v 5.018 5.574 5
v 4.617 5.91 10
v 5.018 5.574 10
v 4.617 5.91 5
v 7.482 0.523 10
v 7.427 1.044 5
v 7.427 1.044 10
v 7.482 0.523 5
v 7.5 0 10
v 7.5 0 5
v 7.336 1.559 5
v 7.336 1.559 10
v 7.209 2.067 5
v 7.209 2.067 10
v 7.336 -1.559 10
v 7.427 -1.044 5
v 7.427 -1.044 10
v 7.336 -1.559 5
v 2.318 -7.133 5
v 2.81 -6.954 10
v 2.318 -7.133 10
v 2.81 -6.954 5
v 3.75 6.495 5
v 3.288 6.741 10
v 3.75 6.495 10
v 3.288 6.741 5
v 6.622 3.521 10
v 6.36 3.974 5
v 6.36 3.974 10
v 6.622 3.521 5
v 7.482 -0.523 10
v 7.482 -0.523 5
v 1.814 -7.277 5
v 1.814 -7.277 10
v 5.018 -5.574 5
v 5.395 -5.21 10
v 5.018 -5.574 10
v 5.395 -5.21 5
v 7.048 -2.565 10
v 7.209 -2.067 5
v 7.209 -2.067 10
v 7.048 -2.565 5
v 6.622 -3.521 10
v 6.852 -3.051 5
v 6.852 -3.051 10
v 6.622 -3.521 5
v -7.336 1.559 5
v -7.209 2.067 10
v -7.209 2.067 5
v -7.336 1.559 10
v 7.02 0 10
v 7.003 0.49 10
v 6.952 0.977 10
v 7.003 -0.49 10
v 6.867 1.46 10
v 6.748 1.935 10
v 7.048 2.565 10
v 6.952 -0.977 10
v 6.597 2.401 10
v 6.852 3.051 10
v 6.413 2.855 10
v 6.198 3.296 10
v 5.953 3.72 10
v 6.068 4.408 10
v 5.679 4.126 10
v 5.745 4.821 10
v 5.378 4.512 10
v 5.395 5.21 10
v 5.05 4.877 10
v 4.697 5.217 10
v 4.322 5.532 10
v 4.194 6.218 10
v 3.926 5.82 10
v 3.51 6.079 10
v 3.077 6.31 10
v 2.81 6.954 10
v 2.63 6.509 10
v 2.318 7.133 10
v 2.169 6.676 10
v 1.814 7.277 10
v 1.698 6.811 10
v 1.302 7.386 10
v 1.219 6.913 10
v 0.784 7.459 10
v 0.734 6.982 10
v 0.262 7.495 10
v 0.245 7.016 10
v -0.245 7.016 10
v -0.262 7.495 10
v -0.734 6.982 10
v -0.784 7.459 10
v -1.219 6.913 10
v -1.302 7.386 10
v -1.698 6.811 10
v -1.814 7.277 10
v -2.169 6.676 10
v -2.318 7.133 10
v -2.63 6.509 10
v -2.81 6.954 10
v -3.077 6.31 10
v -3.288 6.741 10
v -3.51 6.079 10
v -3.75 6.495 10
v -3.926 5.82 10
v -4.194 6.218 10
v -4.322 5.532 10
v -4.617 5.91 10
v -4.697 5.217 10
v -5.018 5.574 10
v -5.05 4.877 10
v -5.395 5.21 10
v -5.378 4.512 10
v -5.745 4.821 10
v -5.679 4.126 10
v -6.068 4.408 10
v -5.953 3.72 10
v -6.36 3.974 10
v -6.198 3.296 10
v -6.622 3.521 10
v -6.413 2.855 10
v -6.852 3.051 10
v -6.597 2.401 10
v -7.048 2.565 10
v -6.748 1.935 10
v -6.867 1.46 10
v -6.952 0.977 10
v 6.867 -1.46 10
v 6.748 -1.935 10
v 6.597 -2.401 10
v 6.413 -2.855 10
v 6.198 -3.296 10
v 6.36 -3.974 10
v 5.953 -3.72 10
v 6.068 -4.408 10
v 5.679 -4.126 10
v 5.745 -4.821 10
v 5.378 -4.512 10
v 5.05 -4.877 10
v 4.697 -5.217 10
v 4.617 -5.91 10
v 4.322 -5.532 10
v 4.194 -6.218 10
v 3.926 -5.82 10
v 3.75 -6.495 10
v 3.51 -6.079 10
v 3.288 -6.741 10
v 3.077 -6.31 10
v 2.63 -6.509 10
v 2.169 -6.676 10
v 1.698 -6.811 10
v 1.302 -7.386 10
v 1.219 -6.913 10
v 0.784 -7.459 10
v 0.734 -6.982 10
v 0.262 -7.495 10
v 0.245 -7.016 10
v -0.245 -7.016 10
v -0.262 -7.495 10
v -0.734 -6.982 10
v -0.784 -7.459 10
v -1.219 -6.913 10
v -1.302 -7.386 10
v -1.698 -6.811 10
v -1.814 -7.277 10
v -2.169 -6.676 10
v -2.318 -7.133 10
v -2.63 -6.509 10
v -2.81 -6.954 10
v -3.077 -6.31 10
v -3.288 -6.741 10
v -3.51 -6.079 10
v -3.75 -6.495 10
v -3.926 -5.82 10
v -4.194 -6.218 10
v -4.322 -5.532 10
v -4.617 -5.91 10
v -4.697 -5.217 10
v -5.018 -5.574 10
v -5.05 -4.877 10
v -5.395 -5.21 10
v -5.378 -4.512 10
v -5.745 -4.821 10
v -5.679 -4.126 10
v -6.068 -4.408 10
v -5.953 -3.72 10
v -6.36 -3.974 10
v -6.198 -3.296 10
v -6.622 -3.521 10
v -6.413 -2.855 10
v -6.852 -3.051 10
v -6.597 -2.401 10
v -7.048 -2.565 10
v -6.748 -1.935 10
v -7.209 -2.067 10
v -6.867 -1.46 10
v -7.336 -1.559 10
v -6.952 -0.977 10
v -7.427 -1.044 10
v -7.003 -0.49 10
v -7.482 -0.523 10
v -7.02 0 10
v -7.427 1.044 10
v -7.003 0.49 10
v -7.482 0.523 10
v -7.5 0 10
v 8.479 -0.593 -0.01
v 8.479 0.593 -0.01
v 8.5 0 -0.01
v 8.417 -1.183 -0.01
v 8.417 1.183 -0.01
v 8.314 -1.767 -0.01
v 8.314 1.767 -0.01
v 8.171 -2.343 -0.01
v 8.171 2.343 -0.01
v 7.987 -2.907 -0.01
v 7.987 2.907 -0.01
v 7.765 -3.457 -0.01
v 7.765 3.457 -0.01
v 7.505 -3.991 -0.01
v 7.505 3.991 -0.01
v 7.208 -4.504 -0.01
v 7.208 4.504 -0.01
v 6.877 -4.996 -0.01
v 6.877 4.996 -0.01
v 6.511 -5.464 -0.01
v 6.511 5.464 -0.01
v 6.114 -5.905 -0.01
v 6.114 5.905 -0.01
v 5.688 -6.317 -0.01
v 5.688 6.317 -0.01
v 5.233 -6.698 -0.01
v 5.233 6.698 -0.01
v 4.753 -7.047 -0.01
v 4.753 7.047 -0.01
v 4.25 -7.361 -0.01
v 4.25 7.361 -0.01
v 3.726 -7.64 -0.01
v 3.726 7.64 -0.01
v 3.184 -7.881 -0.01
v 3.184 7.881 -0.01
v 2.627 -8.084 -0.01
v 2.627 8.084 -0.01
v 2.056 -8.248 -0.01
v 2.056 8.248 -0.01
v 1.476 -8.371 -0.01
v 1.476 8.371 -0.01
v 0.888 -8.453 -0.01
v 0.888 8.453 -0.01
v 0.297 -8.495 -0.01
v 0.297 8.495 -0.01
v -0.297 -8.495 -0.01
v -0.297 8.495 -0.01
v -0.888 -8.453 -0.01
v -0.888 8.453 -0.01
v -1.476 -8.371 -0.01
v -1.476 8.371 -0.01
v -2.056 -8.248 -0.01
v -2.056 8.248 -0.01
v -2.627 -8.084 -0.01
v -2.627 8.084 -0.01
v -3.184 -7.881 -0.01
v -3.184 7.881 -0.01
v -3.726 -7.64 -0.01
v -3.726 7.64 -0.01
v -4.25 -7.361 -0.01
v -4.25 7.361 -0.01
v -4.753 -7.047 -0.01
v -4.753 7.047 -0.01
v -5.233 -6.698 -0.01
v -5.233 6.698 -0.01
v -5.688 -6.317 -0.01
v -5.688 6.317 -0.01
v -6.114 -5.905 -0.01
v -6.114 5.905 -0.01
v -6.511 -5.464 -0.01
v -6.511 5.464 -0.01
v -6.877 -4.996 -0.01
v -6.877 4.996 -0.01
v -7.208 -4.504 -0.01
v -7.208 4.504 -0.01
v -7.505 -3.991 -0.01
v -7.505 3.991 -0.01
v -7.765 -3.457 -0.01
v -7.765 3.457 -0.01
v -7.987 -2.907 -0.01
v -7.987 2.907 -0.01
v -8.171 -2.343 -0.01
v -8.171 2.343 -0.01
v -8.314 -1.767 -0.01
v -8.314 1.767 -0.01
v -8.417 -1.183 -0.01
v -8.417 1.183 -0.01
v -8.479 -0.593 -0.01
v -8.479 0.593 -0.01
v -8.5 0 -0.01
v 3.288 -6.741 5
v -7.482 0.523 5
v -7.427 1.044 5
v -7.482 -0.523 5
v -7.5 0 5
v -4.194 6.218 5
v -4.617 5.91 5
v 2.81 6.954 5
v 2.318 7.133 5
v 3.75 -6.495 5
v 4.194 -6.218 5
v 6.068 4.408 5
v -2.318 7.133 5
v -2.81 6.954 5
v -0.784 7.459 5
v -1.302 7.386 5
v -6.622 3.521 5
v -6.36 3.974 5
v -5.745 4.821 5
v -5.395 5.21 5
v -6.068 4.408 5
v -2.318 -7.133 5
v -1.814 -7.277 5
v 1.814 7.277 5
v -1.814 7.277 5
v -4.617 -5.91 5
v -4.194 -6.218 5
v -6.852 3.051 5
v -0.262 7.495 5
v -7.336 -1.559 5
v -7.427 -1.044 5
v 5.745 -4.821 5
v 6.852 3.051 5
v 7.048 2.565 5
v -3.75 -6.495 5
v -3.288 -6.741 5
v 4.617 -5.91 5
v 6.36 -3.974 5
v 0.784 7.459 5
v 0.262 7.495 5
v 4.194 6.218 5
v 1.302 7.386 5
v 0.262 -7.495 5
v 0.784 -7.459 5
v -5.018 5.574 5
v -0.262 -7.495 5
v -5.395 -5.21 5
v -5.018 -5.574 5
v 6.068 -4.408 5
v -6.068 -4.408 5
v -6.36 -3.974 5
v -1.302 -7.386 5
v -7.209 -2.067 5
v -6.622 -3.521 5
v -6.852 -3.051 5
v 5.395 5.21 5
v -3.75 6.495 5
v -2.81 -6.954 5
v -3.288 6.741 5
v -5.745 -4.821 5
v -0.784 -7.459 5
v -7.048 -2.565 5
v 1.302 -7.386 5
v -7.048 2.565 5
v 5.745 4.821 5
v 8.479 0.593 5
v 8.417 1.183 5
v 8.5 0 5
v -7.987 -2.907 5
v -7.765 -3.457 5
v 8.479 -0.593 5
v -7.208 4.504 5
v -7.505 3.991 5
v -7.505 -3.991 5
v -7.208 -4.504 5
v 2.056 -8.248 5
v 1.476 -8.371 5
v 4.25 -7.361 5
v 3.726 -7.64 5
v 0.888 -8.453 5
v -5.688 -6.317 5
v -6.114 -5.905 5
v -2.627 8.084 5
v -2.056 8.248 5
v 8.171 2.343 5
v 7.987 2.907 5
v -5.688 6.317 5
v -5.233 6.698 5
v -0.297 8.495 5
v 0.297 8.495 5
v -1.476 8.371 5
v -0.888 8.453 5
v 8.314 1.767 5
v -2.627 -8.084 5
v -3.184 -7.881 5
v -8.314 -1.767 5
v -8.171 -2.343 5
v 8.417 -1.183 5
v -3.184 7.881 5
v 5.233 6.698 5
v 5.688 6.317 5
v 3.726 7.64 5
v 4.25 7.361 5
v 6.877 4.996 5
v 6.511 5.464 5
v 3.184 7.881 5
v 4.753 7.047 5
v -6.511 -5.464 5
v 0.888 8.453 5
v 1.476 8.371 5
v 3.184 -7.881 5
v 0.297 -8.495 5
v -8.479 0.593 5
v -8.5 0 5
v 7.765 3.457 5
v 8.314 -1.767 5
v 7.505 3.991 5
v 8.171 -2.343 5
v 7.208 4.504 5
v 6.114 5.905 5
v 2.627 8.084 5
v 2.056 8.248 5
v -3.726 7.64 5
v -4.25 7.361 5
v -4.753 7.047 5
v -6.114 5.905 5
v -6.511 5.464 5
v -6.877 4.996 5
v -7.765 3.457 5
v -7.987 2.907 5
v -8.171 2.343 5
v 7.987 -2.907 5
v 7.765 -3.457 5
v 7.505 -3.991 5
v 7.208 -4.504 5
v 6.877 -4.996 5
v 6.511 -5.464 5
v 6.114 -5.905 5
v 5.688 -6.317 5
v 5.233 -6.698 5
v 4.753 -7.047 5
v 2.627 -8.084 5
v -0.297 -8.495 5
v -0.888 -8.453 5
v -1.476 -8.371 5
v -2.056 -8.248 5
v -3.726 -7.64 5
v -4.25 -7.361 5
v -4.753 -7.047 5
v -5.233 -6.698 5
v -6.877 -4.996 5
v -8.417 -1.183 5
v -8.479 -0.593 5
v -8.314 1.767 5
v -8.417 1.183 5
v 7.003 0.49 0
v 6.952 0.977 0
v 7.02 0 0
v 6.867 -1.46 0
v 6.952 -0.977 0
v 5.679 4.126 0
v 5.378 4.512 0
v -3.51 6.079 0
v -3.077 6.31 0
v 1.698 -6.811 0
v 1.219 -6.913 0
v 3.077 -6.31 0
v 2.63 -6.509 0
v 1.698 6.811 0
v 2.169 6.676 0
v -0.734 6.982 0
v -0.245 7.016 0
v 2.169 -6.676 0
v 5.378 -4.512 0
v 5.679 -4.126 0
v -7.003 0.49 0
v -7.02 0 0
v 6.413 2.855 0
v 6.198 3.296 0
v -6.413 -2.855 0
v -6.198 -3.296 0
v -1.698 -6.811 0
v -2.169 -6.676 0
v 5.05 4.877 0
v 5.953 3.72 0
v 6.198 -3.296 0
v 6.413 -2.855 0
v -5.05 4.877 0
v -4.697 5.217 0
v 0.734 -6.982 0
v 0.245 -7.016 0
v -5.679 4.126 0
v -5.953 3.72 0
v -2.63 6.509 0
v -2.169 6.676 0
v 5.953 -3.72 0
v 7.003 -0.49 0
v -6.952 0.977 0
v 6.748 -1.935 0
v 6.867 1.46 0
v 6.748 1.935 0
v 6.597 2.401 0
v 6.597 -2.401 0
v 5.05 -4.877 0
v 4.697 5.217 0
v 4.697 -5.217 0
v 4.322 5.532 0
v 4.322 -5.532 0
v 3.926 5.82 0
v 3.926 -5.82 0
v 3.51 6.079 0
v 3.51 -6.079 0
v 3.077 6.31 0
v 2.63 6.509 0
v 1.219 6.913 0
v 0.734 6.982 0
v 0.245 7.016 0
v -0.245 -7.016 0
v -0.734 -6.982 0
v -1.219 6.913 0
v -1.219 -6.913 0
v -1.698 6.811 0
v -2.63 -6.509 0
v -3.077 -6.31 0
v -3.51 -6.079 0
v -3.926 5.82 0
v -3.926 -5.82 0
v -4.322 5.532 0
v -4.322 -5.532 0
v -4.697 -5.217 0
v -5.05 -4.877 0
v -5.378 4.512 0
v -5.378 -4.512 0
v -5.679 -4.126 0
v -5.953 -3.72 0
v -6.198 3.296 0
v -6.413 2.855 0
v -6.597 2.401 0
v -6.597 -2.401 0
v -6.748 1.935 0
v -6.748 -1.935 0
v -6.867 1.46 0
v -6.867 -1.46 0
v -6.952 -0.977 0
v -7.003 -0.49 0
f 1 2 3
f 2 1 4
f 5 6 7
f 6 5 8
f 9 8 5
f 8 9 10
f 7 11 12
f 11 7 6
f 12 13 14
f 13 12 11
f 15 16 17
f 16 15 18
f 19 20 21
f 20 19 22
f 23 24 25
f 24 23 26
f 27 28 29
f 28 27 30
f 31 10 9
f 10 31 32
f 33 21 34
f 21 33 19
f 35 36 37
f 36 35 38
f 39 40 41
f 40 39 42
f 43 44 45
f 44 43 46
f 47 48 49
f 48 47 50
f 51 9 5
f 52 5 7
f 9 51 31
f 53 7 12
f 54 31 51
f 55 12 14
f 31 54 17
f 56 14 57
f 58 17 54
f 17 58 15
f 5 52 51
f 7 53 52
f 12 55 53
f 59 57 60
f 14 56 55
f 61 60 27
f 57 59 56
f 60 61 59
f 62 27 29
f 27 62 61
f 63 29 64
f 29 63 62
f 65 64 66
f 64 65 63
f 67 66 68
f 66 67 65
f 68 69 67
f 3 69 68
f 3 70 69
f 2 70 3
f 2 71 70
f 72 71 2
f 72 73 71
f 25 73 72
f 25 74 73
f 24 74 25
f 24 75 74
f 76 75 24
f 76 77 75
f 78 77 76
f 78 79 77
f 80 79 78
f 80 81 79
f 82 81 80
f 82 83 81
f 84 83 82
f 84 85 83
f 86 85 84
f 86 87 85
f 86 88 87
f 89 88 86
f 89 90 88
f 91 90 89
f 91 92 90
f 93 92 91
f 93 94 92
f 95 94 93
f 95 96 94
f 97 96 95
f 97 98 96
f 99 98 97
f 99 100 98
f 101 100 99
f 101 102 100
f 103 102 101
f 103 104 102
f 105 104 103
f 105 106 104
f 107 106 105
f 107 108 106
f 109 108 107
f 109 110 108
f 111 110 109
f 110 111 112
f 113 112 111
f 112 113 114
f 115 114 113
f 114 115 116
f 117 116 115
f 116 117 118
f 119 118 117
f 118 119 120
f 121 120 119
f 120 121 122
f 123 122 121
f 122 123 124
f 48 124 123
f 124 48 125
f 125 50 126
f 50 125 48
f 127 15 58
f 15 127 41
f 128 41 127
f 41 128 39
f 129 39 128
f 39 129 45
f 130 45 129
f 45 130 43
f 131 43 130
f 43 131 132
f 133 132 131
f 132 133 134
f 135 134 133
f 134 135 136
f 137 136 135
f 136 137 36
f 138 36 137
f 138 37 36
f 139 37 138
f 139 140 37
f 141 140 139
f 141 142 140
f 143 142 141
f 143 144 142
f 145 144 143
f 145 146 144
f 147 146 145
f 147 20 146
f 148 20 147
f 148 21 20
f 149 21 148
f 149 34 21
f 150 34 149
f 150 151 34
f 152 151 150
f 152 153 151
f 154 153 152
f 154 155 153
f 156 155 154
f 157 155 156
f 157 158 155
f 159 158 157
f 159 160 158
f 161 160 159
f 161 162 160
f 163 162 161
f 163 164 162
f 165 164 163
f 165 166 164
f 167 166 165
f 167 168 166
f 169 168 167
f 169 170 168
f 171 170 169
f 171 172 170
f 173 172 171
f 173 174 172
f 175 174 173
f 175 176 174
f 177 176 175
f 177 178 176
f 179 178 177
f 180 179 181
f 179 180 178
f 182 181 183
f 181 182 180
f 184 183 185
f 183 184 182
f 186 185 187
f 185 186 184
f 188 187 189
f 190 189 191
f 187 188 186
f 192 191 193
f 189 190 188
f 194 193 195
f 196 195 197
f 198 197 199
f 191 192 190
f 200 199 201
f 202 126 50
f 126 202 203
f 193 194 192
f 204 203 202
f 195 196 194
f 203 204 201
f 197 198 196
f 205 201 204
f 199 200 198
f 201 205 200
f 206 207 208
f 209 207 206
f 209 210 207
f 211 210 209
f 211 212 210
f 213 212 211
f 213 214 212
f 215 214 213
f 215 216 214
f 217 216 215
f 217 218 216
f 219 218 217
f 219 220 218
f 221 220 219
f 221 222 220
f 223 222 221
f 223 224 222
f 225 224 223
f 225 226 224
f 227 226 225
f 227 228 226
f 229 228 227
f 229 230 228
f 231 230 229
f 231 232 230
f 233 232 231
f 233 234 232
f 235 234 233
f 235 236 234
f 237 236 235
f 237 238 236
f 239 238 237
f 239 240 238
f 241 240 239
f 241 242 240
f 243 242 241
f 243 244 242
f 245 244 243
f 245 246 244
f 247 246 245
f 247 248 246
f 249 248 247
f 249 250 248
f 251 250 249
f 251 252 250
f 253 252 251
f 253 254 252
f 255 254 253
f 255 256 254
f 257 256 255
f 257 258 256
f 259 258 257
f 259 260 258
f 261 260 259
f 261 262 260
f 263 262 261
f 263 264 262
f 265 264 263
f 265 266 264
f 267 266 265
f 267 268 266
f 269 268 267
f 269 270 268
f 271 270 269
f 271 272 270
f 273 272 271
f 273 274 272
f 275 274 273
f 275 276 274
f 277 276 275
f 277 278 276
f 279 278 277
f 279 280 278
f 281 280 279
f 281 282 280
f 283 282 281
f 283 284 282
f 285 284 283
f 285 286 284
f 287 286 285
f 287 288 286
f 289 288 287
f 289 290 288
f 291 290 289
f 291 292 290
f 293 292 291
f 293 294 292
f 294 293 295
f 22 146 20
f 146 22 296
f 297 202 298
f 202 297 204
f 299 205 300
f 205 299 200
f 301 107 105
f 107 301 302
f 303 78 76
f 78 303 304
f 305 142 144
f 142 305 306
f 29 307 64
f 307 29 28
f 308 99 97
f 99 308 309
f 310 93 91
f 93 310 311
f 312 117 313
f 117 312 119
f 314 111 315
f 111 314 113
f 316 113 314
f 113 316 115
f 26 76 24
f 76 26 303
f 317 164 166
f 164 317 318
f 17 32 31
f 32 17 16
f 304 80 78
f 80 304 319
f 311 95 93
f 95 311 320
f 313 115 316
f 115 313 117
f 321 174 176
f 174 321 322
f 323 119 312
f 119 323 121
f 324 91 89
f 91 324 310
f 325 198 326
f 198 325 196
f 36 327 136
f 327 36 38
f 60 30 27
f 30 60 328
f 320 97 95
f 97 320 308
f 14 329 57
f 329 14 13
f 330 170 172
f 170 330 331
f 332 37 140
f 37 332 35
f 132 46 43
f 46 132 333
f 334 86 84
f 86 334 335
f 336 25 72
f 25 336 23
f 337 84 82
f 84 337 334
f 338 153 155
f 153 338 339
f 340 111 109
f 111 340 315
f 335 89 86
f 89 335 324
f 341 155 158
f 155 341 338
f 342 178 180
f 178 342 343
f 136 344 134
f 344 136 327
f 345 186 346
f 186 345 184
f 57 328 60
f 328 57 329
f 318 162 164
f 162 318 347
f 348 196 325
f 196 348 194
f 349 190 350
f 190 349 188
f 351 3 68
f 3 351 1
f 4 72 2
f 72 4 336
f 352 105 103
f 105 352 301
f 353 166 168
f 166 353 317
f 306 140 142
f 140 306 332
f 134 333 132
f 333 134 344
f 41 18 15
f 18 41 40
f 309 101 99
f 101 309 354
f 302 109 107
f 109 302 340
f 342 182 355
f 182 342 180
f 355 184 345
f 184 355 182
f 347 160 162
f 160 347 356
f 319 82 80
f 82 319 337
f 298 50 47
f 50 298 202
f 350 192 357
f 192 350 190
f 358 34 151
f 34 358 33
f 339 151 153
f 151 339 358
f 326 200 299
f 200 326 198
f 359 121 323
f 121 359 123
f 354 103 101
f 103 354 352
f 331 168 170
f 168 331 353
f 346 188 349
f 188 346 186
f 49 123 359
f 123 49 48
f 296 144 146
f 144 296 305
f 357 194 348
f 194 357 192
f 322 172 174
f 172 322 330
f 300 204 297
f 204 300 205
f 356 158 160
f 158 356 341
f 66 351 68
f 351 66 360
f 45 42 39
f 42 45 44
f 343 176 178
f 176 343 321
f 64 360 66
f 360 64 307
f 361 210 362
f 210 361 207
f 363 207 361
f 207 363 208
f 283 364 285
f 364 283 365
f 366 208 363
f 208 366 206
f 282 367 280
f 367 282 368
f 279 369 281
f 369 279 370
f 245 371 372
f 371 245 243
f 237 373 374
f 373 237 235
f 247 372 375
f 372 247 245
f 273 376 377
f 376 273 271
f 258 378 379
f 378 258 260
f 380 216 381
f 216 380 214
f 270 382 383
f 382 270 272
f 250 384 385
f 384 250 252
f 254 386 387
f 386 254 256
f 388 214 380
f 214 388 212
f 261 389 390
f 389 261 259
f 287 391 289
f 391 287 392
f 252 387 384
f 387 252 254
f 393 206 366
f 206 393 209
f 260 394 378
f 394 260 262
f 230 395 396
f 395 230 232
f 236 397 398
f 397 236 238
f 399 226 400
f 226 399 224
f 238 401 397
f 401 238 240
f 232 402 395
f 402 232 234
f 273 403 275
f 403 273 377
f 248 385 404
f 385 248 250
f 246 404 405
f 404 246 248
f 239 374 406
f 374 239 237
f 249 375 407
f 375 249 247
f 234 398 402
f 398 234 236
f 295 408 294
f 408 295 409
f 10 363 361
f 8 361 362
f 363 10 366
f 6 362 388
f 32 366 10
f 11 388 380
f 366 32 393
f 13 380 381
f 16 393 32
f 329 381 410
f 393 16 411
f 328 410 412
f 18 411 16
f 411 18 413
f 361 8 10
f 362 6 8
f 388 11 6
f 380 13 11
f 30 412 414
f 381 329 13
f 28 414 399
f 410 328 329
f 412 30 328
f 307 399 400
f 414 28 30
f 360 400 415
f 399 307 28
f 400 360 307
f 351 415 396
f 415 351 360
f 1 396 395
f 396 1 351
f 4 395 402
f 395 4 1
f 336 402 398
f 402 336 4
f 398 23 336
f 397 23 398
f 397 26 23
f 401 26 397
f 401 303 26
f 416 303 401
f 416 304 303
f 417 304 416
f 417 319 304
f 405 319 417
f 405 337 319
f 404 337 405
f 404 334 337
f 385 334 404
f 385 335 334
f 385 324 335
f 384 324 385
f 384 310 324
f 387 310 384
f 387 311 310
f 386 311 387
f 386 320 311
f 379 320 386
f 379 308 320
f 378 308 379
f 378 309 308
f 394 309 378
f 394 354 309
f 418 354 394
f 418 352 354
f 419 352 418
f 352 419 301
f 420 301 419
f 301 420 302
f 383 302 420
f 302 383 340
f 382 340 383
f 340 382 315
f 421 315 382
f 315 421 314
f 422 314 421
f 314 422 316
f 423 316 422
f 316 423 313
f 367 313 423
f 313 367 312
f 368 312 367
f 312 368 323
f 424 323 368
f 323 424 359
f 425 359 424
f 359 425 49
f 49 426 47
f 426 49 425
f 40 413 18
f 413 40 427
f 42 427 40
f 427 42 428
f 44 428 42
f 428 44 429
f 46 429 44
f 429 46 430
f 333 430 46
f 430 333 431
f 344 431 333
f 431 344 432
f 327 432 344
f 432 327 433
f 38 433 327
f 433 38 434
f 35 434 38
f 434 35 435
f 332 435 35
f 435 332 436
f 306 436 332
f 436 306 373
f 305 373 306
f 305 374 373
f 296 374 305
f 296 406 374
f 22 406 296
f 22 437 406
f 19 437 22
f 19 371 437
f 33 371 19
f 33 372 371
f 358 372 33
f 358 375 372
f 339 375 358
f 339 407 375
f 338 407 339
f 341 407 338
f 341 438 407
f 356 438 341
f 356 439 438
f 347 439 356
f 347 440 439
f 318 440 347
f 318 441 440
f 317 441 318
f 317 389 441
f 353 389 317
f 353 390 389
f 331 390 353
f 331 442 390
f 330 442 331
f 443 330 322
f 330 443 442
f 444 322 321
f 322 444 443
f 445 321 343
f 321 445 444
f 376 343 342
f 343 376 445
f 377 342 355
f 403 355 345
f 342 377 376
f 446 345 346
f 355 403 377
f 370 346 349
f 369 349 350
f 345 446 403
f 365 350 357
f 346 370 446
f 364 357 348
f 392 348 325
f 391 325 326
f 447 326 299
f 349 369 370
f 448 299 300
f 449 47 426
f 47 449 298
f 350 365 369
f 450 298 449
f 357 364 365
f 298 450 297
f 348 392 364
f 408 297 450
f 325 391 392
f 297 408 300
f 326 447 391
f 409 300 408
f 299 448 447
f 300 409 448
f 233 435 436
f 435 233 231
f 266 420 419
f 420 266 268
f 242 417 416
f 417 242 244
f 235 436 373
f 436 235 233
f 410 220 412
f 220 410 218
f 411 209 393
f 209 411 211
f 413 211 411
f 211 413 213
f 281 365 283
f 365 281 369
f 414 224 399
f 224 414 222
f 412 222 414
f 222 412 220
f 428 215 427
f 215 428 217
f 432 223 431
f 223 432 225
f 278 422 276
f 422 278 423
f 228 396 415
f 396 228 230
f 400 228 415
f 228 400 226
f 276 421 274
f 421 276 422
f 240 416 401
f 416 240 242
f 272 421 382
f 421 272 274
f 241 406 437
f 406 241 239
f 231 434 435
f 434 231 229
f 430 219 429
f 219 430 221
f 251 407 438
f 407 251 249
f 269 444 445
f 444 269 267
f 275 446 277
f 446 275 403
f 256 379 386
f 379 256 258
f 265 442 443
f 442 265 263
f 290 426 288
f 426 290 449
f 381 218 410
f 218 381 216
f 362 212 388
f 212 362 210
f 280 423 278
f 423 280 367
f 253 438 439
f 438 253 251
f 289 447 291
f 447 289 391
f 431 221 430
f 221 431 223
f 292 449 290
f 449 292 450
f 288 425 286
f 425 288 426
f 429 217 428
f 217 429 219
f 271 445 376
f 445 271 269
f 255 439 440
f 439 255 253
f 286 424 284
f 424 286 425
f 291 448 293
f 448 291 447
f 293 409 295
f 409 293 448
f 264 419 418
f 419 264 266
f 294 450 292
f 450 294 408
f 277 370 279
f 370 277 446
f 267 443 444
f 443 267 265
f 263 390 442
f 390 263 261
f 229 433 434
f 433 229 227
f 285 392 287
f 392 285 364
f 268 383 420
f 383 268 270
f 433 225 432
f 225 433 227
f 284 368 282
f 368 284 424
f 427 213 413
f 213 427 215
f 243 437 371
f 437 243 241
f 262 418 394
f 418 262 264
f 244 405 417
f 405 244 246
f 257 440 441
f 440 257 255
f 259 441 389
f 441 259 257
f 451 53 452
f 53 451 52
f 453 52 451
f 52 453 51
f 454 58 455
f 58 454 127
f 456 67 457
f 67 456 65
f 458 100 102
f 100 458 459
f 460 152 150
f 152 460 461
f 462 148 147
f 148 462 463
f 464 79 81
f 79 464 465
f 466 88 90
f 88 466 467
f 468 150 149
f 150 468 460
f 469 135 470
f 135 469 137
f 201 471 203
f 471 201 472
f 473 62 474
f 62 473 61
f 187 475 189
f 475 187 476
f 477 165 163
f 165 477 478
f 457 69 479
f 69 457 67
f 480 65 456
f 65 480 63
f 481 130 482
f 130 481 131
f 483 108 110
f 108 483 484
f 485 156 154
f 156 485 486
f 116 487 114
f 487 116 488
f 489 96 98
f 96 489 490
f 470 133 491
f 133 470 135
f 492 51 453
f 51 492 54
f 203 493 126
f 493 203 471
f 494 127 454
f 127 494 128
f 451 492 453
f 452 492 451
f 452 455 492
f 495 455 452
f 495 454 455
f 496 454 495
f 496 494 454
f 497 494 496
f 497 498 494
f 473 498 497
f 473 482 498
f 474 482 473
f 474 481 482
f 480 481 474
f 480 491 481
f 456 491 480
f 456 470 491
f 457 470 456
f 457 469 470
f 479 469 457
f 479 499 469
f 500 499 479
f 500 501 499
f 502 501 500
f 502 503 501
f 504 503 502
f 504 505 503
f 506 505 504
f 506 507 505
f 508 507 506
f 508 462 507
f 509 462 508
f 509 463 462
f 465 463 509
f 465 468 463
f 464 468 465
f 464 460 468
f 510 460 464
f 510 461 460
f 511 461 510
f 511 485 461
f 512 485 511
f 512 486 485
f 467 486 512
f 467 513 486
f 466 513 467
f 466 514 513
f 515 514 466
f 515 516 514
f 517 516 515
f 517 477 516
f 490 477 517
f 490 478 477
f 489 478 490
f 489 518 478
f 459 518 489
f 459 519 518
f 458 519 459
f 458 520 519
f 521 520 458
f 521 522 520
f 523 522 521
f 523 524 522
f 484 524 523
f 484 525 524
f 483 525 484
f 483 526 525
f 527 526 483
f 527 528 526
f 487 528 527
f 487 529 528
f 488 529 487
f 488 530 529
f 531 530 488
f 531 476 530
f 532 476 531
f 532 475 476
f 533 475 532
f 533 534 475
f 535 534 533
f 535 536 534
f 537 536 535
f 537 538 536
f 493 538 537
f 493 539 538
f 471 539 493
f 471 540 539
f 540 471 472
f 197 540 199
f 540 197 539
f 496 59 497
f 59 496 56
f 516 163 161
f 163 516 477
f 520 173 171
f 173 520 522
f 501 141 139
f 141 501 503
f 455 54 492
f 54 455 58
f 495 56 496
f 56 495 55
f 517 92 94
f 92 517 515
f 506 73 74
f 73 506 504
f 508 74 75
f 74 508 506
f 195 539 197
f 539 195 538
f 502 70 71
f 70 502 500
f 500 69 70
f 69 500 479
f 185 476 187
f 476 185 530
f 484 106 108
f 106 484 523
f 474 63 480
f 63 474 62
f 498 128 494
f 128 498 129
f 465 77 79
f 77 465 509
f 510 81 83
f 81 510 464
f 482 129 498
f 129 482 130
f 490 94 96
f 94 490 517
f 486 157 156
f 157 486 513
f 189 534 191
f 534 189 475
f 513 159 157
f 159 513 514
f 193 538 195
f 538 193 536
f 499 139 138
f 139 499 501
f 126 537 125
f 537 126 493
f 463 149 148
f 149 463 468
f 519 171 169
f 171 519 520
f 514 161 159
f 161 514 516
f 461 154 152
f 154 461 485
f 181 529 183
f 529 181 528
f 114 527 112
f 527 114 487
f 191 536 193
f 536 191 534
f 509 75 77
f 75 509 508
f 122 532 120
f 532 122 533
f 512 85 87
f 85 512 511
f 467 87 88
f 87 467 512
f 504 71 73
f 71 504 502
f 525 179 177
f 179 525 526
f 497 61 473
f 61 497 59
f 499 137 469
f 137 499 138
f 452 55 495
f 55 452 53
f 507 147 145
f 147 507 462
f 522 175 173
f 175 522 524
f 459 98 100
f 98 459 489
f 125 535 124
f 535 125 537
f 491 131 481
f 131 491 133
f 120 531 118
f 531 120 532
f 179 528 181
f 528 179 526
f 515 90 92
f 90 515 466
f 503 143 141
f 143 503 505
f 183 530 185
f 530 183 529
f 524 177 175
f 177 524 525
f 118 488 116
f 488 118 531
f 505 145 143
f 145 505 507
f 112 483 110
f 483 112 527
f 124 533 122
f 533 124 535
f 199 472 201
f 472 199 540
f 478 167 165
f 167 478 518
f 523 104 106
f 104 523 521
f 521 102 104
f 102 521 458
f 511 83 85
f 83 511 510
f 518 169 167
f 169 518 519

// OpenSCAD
// file: ../../Base/Rotation.scad
// Fischertechnik Box Foundation
// Geometry Helpers Rotation

include <PlacementOptions.scad>

// getRotatedSpace(space, rotation=NoRotation)
// Rotates the space dependent on the specified rotation

function getRotatedSpace(space, rotation=NoRotation) = [
    (rotation == Rotate90 || rotation == Rotate270) ? space.y : space.x,
    (rotation == Rotate90 || rotation == Rotate270) ? space.x : space.y
];

// Rotates the given space around the fixed left lower corner
// space = the space the children needs as width/depth list [width,depth]
// rotation = 0 Rotate0 degrees, 1 Rotate90 degrees, 2 Rotate180 degrees, 3 Rotate270 degrees (equivalent to -90)

module RotateFix(space, rotation=Rotate0) {
    dy = (rotation == Rotate0 || rotation == Rotate270) ? 0 :
        (rotation == Rotate90) ? space.x :
        space.y;
    dx = (rotation < Rotate180) ? 0 :
        (rotation == Rotate180) ? space.x :
        space.y;
    
    translate([dx, dy, 0])
        rotate([0, 0, rotations[rotation]])
            children();
}
// file: ../../Base/Alignment.scad
// Fischertechnik Box Foundation
// Geometry Helpers Alignment

include <PlacementOptions.scad>

// getAlignedX(elementWidth, spaceWidth, align=AlignRight, offset=0)
// Gets the aligned X offset of an element with the given
// width in the given space.
// elementWidth = The width of the element to positon
// spaceWidth = The space where the element should be aligned
// align = 0 AlignLeft, 1 AlignCenter, 2 AlignRight
// offset = an optional offset from the aligned position. When
// aligned left or centered, then positive values are in X direction.
// When aligned right then positive values are in negative X direction.

function getAlignedX(elementWidth, spaceWidth, align=AlignRight, offset=0) =
    (align == AlignLeft) ?
        offset :
        ((align == AlignCenter) ?
        (spaceWidth - elementWidth)/2 + offset :
        spaceWidth - offset - elementWidth);

// getAlignedY(elementDepth, spaceDepth, align=AlignTop, offset=0)
// Gets the aligned Y offset of an element with the given
// depth in the given space.
// elementDepth = The depth of the element to positon
// spaceDepth = The space where the element should be aligned
// align = 0 AlignBottom, 1 AlignCenter, 2 AlignTop
// offset = an optional offset from the aligned position. When
// aligned bottom or centered, then positive values are in Y direction.
// When aligned top then positive values are in negative Y direction.

function getAlignedY(elementDepth, spaceDepth, align=AlignTop, offset=0) =
    (align == AlignBottom) ?
        offset :
        ((align == AlignCenter) ?
        (spaceDepth - elementDepth)/2 + offset :
        spaceDepth - offset - elementDepth);
// file: ../../Base/PlacementOptions.scad
// Fischertechnik Box Foundation
// Placement Options

// Alignment
NoAlign = 0;
AlignLeft = 1;
AlignBottom = 2;
AlignCenter = 3;
AlignRight = 4;
AlignTop = 5;

// Element rotation degree steps
rotations = [0, -90, -180, -270];

// Rotation
NoRotation = 0;
Rotate0 = 0;
Rotate90 = 1;
Rotate180 = 2;
Rotate270 = 3;

// Docking (seen from above)
NoDock = -1;
DockLeft = 0;
DockTop = 1;
DockRight = 2;
DockCorner = 2;
DockBottom = 3;

// Web corners
LowerLeft = 0;
UpperLeft = 1;
UpperRight = 2;
LowerRight = 3;

// Web position relative to corner
LeftOfCorner = 0;
RightOfCorner = 1;
// file: ../../Base/Boxes.scad
// Fischertechnik Box Foundation
// Pre-designed Boxes

use <Constants.scad>

include <PlacementOptions.scad>

box190Width = 190;
box190Depth = 130;
box130Width = 130;
box130Depth = 95;
boxUsageHeight = 33.9;
boxWallThickness = 2.4;
boxBaseThickness = 1.0;
boxWebWidth = 3.0;

// getBoxWallThickness()
// Gets the wall thickness of a Fischertechnik Box

function getBoxWallThickness() = boxWallThickness;

// Gets the usable height of a fischertechnik box
function getBoxUsageHeight() = boxUsageHeight;

// Gets the thickness of the Fischertechnik box base.
function getBoxBaseThickness() = boxBaseThickness;

// Gets the width of a box web
function getBoxWebWidth() = boxWebWidth;

// Gets the usable inner space of a Box 190 as an x/y-list
function getBox190Space() = [
    box190Width - 2*getBoxWallThickness(), 
    box190Depth - 2*getBoxWallThickness() ];

// Imports the Fischertechnik empty box 130x190 mm and places it at position 0,0
// 190x130 are the outer sizes, the inner space is slightly smaller. Use getBox190Space() to get the inner sizes.
// This module needs the STL file "Fischertechnik Box 130x190.stl" in the library path.
// The box is positioned that the usable inner space is at the 0,0,0 position. The

module Box190() {
    translate([-getBoxWallThickness(),-getBoxWallThickness(),-getBoxBaseThickness()])
        import("Fischertechnik Box 130x190.stl", convexity=3);
}

// Gets the usable inner space of a Box 130 as an x/y-list
function getBox130Space() = [
    box130Width - 2*getBoxWallThickness(), 
    box130Depth - 2*getBoxWallThickness() ];

// Imports the Fischertechnik empty box 95x130 mm and places it at position 0,0
// 190x130 are the outer sizes, the inner space is slightly smaller. Use getBox190Space() to get the inner sizes.
// This module needs the STL file "Fischertechnik Box 95x130.stl" in the library path.
// The box is positioned that the usable inner space is at the 0,0,0 position. The

module Box130() {
    translate([-getBoxWallThickness(),-getBoxWallThickness(),-getBoxBaseThickness()])
        import("Fischertechnik Box 95x130.stl", convexity=3);
}

// Creates a web at the specified box walls
// corner 0 = LowerLeft, 1 = UpperLeft, 2 = UpperRight, 3 = LowerRight
// side 0 = LeftOfCorner, 1 = RightOfCorner
// distance = Distance in mm from the corner
// boxSpace = inner width and depth of the box (default: Box 190)
// webWidth = length of the web (default is 3 mms)
// webThickness = thickness of the web (default is 1 mm)

module BoxWeb(corner, side, distance, boxSpace=getBox190Space(), webWidth=getBoxWebWidth(), webThickness=1.0) {
    sink = getBoxWallThickness()/2;

    width = (corner % 2 == 0) ? 
            (side == LeftOfCorner ? webWidth : webThickness) :
            (side == LeftOfCorner ? webThickness : webWidth);

    depth = (corner % 2 == 0) ? 
            (side == RightOfCorner ? webWidth : webThickness) :
            (side == RightOfCorner ? webThickness : webWidth);
    
    xDiff = corner == LowerLeft ? 
                (side == LeftOfCorner ? -sink : distance) :
            (corner == UpperLeft ?                
                (side == LeftOfCorner ? distance : -sink) :
            (corner == UpperRight ?
                (side == LeftOfCorner ? boxSpace.x-webWidth+sink : boxSpace.x-distance-webThickness) :
                (side == LeftOfCorner ? boxSpace.x-distance-webThickness: boxSpace.x-webWidth+sink)));

    yDiff = corner == LowerLeft ? 
                (side == RightOfCorner ? -sink : distance) :
            (corner == UpperLeft ?
                (side == RightOfCorner ? boxSpace.y-distance : boxSpace.y-webWidth+sink) :
            (corner == UpperRight ?
                (side == RightOfCorner ? boxSpace.y-webWidth+sink : boxSpace.y-distance) :
                (side == RightOfCorner ? distance : -sink)));
    
    translate([xDiff, yDiff, -getExcess()])
        cube([width, depth, boxUsageHeight + 2*getExcess()]);
}
// file: ../../Base/Placement.scad
// Fischertechnik Box Foundation
// Geometry Helpers Placement

use <Constants.scad>
use <Alignment.scad>
use <Rotation.scad>
use <Boxes.scad>

include <PlacementOptions.scad>

// Place(x=0, y=0, elementSpace=[0,0], alignX=AlignLeft, alignY=AlignBottom, rotation=Rotate0, boxSpace=getBox190Space())
// Places the child at the specified position
// y = Y-Position. This is a relative position when an X aligment is specified.
// x = X-Position. This is a relative position when an Y aligment is specified.
// elementSpace = space of the element to be placed [x,y]
// alignX = -1=NoAlign, 0 AlignLeft, 1 AlignCenter, 3 AlignRight (elementSpace and boxSpace required!)
// alignY = -1=NoAlign, 2 AlignBottom, 1 AlignCenter, 4 AlignTop (elementSpace and boxSpace required!)
// rotation = 0 Rotate0 0 degrees, 1 Rotate90 90 degrees, 
// 2 Rotate180 180 degrees, 3 Rotate270 270 degrees (equivalent to -90)
// boxSpace = Inner space of the box where the placement occurs [x,y] - default is Box 190x130 inner space

module Place(x=0, y=0, elementSpace=[0,0], 
  alignX=AlignLeft, alignY=AlignBottom, 
  rotation=NoRotation, boxSpace=getBox190Space()) {

    module Position(x, y, space, rotation=Rotate0) {
        translate([x, y, 0])
            RotateFix(space, rotation)
                children();
    }

    space = getRotatedSpace(elementSpace, rotation);
    alignedX = getAlignedX(space.x, boxSpace.x, alignX, x);
    alignedY = getAlignedY(space.y, boxSpace.y, alignY, y);
    Position(alignedX, alignedY, elementSpace, rotation)
        children();
}

// Center(space=getBox130Space(), elementSpace=[0,0])
// space = Space where the children is centered. For cylinder use centered=true and no elementSpace.
// elementSpace = space of the element to be centered [x,y]

module Center(space=getBox190Space(), elementSpace=[0,0]) {
    Place(elementSpace=elementSpace, boxSpace=space, alignX=AlignCenter, alignY=AlignCenter)
        children();
}

// CenterHorizontal(width=0, y=0, offset=0, space=getBox130Space())
// width = Width of the element to be placed.
// y = Y position of the element
// offset = Offset from the center position (negative will be left of the center)
// space = Space where the element is placed

module CenterHorizontal(width=0, y=0, offset=0, space=getBox190Space()) {
    Place(x=offset, y=y, elementSpace=[width, 0], boxSpace=space, alignX=AlignCenter)
        children(0);
}

// CenterVertical(depth=0, x=0, offset=0, space=getBox130Space())
// depth = Depth of the element to be placed.
// x = X position of the element
// offset = Offset from the center position (negative will be down of the center)
// space = Space where the element is placed

module CenterVertical(depth=0, x=0, offset=0, space=getBox190Space()) {
    Place(x=x, y=offset, elementSpace=[0, depth], boxSpace=space, alignY=AlignCenter)
        children(0);
}

// getIsVertical(align)
// True if the specified alignment needs a vertical orientation for a divider (AlignRight, AlignLeft)

function getIsVertical(align) = (align == AlignRight || align == AlignLeft);

// getIsHorizontal(align)
// True if the specified alignment needs a horizontal orientation for a divider (AlignTop, AlignBottom)

function getIsHorizontal(align) = (align == AlignTop || align == AlignBottom);
// file: ../../Base/Constants.scad
// Fischertechnik Box Foundation
// Constants

// Constant values necessary for multiple elements

// Base constants
dividerThickness = 1.2;
excess = 0.01;
fragments = 90;
tolerance = 0.8;

// Gets the thickness of a divider 
function getDividerThickness() = dividerThickness;

// Gets the excess that is used to merge walls into each other
function getExcess() = excess;

// Gets amount of fragments of a cylinder
function getFragments() = fragments;

// Gets the inner tolerance of a frame to each side
function getTolerance() = tolerance;


// Fischertechnik specific constants
axisDiameter = 4;
axisBottomDiameter = axisDiameter + 1;
standardEdgeDistance = 2.5;
standardWebDistance = 11.5;
standardCornerLength = 15;
tubeWallFactor = 0.8;
smallPartsFrameHeight = 20;

// Gets axis diameter
function getAxisDiameter() = axisDiameter;

// Gets axis bottom diameter for thicker part at the bottom
function getAxisBottomDiameter() = axisBottomDiameter;

// gets the standard distance to the wall of the box for dockable frames with webs
function getStandardEdgeDistance() = standardEdgeDistance;

// gets the standard distance of each web to the corner of the dockable frame
function getStandardWebDistance() = standardWebDistance;

// gets the standard length of the corner walls of a dockable frame
function getStandardCornerLength() = standardCornerLength;

// gets the wall thickness of a tube.
function getTubeWallThickness() = tubeWallFactor * getDividerThickness();

// gets the frame height for docked small parts boxes.
function getSmallPartsFrameHeight() = smallPartsFrameHeight;
// main file
// Fischertechnik Box Foundation
// ModelBase
// Test LeveledTube

use <../../ModelBase/Simple.scad>

LeveledTube(height=10, diameter=15, levelHeight=5, levelDiameter=17);
